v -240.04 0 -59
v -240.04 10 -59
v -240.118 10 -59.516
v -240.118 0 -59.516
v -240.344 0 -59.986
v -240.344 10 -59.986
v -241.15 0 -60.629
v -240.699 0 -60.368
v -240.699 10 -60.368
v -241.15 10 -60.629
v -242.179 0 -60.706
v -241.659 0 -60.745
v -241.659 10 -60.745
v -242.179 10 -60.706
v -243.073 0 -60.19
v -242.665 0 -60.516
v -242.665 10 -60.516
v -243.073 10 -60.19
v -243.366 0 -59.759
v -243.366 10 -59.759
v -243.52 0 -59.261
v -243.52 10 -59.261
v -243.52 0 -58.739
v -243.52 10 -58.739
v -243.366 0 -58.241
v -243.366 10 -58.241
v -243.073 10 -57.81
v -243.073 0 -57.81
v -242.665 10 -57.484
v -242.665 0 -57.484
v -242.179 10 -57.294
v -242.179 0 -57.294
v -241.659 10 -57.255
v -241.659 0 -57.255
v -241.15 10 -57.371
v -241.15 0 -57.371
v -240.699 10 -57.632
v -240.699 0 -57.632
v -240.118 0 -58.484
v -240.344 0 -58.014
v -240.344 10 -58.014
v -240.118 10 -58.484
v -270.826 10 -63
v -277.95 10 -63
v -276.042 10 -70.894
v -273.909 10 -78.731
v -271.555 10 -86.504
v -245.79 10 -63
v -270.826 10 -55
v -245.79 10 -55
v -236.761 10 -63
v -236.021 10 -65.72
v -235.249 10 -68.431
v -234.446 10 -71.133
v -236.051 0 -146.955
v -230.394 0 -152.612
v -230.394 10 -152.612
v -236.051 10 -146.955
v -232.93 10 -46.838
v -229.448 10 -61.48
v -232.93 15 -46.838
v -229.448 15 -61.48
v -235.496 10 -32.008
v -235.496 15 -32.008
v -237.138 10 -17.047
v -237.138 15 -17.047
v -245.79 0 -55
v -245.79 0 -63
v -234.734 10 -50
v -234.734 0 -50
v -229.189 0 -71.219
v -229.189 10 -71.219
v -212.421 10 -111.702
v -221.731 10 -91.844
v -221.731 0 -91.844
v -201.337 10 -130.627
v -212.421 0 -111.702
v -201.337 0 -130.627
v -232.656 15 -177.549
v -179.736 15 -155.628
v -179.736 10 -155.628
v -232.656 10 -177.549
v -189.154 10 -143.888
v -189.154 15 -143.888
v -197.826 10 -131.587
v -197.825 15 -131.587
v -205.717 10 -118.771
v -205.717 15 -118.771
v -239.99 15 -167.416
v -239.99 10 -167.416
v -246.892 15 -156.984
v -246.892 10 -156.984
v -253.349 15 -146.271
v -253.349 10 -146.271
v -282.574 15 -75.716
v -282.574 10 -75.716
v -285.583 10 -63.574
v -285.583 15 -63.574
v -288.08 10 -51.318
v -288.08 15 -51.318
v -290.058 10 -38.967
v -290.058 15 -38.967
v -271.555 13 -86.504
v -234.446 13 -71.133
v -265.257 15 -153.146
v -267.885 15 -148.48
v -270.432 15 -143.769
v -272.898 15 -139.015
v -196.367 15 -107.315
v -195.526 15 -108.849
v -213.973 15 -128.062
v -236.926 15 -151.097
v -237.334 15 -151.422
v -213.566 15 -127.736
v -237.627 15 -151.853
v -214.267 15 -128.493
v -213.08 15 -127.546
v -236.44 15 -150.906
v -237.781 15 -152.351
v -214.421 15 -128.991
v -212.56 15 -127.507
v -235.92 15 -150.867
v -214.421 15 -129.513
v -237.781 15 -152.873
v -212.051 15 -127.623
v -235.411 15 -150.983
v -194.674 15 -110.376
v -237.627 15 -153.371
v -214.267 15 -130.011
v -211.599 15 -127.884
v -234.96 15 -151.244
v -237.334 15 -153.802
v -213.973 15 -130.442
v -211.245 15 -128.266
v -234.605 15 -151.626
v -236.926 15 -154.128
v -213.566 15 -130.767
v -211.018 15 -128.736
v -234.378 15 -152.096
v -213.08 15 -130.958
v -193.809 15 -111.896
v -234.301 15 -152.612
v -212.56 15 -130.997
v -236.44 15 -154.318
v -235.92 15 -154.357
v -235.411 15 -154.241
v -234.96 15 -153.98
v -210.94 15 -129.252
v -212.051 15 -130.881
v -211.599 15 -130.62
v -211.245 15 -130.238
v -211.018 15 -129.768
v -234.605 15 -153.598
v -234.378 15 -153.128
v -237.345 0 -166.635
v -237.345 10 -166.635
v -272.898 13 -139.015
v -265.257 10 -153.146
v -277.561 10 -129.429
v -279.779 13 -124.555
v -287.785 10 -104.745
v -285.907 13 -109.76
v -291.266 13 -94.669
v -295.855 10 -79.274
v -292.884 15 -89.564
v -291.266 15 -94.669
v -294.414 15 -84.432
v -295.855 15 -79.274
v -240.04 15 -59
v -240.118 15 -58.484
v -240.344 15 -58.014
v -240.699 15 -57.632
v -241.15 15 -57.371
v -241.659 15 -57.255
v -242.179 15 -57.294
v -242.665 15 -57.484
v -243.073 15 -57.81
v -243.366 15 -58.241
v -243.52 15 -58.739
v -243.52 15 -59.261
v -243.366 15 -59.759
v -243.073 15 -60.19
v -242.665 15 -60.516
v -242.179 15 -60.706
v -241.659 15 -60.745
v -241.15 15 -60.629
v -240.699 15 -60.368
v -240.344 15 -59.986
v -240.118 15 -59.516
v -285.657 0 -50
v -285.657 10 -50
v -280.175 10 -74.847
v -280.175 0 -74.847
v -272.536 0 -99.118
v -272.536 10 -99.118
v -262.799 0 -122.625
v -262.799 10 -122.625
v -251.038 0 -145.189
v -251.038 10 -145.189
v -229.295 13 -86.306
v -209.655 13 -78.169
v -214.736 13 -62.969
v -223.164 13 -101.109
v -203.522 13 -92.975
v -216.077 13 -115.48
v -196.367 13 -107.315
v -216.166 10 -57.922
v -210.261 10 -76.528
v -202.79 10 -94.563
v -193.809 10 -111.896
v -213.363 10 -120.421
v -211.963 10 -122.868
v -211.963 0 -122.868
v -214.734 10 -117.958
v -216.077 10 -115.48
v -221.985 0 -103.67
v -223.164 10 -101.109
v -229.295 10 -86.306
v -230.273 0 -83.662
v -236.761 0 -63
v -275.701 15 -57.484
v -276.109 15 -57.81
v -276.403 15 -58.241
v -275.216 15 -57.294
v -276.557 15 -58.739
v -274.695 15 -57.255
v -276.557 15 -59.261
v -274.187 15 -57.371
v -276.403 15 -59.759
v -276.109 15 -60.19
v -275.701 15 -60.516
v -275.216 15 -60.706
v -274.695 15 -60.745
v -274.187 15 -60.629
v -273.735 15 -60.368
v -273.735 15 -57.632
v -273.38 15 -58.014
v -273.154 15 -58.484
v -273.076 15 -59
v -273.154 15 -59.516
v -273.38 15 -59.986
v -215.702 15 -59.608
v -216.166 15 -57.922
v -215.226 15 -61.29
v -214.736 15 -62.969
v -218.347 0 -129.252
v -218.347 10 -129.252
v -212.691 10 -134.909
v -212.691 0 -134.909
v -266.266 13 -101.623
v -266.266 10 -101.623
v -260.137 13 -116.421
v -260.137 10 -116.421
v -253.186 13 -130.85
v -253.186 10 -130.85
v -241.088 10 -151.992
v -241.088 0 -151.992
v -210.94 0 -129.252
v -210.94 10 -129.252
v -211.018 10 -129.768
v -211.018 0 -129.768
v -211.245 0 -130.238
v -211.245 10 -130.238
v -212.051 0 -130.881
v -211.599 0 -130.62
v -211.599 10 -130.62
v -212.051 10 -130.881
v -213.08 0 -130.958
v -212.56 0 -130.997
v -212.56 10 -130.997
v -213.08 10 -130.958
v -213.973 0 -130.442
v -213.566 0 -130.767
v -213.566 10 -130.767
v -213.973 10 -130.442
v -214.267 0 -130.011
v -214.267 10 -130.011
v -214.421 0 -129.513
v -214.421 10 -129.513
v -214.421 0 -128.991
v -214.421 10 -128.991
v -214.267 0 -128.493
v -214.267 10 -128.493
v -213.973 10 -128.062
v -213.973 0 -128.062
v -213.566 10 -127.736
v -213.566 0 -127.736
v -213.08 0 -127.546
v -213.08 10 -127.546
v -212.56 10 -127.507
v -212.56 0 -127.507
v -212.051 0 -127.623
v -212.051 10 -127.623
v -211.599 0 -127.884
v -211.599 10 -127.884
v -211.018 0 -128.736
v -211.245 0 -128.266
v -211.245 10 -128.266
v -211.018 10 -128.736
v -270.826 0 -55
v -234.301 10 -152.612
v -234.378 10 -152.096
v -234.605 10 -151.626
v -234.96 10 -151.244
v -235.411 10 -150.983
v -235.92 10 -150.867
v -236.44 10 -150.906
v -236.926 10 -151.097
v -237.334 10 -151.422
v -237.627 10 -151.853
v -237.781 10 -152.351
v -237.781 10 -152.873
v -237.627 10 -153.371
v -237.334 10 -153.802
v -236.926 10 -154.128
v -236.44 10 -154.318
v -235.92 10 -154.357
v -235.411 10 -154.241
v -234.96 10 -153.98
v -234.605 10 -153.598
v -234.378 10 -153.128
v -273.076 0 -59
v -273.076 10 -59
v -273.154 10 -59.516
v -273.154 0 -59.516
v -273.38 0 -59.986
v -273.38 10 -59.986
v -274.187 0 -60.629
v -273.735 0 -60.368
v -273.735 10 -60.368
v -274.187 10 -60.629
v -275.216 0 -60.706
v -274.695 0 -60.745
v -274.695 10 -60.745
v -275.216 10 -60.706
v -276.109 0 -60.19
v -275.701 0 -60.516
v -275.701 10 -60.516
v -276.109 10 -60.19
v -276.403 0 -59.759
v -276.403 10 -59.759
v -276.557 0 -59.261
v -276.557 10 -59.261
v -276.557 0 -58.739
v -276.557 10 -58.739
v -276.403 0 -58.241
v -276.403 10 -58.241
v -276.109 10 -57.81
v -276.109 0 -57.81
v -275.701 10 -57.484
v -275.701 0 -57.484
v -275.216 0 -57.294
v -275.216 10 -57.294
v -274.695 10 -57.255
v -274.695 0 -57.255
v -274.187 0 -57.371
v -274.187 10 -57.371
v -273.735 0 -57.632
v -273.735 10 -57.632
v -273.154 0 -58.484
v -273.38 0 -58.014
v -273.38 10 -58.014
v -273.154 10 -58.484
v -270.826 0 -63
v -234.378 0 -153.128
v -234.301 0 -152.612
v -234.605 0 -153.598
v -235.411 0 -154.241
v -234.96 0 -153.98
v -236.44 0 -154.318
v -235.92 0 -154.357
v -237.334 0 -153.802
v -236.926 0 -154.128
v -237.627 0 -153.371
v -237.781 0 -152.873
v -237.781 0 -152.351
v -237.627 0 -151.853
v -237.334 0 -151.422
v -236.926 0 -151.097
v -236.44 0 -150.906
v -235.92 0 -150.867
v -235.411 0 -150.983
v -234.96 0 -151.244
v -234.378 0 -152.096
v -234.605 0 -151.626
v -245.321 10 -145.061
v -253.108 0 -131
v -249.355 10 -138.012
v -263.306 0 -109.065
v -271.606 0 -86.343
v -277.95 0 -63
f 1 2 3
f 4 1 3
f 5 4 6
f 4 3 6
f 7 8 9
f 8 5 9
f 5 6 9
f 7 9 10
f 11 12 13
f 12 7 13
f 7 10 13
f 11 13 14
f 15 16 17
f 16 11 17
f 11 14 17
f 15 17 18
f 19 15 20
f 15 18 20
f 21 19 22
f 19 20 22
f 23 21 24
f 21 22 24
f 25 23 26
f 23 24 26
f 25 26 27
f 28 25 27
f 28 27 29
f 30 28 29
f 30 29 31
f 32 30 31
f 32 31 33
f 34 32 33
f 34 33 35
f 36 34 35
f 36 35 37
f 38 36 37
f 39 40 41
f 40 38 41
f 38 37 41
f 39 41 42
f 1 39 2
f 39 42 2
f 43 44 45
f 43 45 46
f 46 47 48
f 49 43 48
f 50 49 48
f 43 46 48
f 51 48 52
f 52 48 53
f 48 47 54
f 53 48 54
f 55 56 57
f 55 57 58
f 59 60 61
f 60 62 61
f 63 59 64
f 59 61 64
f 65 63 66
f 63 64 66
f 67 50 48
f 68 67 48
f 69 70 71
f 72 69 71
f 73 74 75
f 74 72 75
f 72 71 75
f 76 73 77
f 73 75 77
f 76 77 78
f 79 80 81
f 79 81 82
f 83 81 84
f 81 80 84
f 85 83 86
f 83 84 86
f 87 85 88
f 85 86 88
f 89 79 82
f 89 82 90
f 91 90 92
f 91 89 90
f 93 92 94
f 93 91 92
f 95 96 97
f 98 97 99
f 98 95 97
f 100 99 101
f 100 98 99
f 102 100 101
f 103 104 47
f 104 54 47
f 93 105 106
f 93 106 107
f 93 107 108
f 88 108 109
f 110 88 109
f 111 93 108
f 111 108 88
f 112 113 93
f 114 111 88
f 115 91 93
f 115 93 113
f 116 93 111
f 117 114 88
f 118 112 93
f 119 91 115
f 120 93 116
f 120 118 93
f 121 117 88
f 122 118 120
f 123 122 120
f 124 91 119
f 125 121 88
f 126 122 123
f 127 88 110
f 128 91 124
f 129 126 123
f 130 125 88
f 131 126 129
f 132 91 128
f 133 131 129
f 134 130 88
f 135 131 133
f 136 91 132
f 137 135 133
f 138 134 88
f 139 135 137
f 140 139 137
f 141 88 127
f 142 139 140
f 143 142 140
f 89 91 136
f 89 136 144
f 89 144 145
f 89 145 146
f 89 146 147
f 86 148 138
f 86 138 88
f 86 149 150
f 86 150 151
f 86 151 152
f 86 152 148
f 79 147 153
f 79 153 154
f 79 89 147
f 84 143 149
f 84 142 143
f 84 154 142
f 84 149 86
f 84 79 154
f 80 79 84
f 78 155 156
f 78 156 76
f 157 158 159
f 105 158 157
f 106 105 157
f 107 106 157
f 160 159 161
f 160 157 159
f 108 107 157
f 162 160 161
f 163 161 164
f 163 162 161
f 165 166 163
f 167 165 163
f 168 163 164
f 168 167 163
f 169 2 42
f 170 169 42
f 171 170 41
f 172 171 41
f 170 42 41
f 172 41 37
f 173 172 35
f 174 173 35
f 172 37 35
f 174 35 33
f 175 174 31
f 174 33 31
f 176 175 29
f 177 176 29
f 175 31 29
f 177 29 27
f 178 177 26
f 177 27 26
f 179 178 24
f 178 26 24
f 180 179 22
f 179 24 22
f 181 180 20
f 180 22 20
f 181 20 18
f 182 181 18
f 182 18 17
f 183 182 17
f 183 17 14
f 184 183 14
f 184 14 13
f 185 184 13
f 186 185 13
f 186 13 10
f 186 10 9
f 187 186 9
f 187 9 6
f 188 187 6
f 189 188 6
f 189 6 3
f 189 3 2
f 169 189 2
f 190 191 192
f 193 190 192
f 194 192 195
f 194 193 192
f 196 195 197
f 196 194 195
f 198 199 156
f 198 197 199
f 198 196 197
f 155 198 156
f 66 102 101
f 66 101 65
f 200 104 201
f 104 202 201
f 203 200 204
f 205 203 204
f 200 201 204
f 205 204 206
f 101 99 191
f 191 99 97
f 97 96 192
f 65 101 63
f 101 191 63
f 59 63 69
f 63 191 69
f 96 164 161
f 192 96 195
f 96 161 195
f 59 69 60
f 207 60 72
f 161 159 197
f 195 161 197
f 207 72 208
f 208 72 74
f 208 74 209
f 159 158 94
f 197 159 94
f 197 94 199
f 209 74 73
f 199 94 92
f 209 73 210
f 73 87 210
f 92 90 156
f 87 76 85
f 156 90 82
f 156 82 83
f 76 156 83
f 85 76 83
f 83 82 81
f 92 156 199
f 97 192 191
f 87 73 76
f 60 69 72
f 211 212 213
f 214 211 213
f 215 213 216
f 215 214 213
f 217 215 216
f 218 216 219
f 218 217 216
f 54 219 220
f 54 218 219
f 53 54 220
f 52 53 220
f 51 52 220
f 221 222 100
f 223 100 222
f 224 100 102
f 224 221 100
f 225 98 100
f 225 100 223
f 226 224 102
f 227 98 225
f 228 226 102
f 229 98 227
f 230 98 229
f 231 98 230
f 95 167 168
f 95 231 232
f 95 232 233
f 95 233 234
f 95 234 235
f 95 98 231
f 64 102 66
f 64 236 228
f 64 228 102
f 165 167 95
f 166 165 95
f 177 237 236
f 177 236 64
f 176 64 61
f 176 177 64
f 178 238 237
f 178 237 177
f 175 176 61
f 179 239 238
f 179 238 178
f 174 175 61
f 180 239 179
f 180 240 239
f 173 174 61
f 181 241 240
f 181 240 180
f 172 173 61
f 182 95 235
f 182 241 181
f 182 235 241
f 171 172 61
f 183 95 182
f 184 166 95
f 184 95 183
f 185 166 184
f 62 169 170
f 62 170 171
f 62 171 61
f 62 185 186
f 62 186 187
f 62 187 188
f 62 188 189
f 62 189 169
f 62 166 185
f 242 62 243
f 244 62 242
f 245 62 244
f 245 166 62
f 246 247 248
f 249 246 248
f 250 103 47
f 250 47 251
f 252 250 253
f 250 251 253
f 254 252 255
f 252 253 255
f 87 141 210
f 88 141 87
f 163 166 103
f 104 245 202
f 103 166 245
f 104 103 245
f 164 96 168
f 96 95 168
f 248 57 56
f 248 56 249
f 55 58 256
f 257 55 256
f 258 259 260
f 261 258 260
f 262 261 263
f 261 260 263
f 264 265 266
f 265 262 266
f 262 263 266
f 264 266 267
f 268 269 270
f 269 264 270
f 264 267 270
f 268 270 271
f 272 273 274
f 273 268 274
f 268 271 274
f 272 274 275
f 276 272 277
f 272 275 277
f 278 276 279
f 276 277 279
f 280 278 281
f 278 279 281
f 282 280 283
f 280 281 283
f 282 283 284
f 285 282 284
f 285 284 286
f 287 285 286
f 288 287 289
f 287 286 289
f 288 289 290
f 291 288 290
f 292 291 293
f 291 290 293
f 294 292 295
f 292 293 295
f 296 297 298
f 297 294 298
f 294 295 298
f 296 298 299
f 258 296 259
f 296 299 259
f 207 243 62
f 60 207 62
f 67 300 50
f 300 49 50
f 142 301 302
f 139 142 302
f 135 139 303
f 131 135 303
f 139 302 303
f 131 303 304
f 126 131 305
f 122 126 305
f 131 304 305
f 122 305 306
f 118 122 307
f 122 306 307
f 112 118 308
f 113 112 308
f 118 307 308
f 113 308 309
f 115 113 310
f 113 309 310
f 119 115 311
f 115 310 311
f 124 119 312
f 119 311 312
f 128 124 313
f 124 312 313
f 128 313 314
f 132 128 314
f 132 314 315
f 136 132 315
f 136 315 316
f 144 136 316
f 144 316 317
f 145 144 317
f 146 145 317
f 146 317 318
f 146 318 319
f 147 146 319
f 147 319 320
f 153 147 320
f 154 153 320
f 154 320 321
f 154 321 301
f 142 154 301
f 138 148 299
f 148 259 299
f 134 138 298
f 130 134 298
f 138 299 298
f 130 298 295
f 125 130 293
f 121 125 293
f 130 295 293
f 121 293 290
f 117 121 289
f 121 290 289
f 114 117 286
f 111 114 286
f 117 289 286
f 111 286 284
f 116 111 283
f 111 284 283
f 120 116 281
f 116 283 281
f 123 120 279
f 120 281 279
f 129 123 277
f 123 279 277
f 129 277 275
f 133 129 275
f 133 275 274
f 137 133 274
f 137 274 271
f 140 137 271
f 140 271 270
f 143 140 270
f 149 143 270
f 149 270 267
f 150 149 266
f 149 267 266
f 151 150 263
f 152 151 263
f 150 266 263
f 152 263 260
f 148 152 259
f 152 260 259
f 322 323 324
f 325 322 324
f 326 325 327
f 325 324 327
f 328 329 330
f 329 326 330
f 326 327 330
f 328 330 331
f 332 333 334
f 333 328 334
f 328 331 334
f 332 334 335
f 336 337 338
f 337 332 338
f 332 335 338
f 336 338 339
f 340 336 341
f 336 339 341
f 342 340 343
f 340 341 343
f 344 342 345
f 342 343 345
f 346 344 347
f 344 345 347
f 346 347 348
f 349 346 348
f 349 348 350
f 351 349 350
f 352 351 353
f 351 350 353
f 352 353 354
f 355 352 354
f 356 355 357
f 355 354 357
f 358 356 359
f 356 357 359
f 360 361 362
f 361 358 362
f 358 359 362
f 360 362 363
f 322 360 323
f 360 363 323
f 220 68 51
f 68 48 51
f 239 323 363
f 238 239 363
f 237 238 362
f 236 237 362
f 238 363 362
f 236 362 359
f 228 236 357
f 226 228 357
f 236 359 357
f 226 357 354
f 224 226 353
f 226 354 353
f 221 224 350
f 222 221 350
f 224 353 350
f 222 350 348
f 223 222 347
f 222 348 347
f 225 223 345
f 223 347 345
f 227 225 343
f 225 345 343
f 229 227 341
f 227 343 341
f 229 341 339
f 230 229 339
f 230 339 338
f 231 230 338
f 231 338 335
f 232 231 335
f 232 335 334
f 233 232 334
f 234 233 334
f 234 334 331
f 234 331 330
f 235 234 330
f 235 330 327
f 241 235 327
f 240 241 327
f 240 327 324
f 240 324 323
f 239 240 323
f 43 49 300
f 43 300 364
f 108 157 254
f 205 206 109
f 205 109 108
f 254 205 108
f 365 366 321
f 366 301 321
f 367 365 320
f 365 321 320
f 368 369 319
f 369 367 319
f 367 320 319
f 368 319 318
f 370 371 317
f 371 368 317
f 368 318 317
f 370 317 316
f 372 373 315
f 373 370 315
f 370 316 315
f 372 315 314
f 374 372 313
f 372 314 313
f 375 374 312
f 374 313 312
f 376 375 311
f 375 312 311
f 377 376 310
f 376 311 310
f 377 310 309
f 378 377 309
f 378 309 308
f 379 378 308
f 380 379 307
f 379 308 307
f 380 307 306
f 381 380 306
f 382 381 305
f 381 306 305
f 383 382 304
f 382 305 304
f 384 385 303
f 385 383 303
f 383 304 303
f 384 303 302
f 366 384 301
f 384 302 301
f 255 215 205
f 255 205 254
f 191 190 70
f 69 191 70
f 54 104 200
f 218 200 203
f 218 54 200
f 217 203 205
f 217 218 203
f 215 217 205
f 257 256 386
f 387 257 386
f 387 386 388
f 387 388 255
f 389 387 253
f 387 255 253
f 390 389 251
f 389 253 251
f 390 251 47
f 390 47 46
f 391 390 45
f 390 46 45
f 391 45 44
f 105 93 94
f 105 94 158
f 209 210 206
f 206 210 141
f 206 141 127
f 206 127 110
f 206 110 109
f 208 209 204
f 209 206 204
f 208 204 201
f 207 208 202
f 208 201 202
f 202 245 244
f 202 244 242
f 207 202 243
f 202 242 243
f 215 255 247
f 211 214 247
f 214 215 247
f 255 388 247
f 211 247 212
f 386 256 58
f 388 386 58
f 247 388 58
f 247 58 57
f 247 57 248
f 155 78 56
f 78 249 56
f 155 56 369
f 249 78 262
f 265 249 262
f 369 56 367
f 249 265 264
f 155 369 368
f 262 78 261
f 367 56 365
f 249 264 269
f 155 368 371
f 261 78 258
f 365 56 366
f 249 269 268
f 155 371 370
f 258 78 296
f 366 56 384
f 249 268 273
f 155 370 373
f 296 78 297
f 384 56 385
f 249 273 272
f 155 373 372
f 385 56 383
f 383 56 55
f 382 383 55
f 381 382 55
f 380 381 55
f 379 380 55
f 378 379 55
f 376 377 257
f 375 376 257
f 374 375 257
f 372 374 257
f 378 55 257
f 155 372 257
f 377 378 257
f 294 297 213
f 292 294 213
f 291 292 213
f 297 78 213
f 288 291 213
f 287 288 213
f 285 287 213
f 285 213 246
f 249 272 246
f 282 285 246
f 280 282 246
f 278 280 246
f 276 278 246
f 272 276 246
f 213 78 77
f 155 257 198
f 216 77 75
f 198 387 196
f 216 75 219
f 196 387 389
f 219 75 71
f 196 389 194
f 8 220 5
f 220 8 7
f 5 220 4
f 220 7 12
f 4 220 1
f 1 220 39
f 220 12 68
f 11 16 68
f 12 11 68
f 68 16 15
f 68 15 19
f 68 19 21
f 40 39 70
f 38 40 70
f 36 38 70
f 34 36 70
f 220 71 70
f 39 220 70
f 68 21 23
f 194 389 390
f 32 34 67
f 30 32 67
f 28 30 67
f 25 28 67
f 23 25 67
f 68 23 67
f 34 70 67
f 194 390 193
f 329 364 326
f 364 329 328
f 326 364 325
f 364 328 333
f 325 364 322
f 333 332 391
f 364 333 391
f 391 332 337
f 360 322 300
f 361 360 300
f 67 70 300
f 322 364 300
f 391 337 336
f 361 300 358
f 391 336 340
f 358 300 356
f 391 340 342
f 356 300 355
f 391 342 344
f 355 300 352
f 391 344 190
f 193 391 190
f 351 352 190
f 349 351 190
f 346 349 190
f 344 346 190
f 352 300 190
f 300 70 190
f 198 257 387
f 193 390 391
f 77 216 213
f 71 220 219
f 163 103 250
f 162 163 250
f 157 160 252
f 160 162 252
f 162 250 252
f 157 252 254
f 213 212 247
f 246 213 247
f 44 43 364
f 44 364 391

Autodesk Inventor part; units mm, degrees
ref_plane "YZ Plane" through (0, 0, 0) normal (1, 0, 0) x (0, 1, 0)
sketch "Sketch1" plane through (0, 0, 0) normal (0, 1, 0) x (-1, 0, 0)
  circle A0 centre (0, 0) radius 217.5
  circle A1 centre (0, 0) radius 312.5
  line L0 (0, 0) -> (220.9709, -220.9709)
  line L1 (0, 0) -> (312.5, 0) construction
  line L2 (312.1398, -15) -> (216.9821, -15)
  line L3 (231.3228, -210.1096) -> (164.0361, -142.8229)
  circle A2 centre (0, 0) radius 240
  circle A3 centre (0, 0) radius 290
  line L4 (285.6571, -50) -> (234.7339, -50)
  line L5 (237.3454, -166.6348) -> (201.3373, -130.6266)
  dimension "d0" = 435
  dimension "d1" = 625
  dimension "d2" = 45
  dimension "d3" = 15
  dimension "d4" = 15
  dimension "d5" = 22.5
  dimension "d6" = 22.5
  dimension "d7" = 35
  dimension "d8" = 35
extrude "Extrusion1" add sketch "Sketch1" along normal blind 10 contours A2 L4 A3 L5
sketch "Sketch2" plane through (0, 10, 0) normal (0, 1, 0) x (1, 0, 0)
  arc A0 (-237.3454, 166.6348) -> (-285.6571, 50) centre (0, 0) ccw projected
  line L0 (-285.6571, 50) -> (-234.7339, 50) projected
  arc A1 (-201.3373, 130.6266) -> (-234.7339, 50) centre (0, 0) ccw projected
  line L1 (-201.3373, 130.6266) -> (-237.3454, 166.6348) projected
  circle A2 centre (0, 0) radius 245
  circle A3 centre (0, 0) radius 285
  line L2 (-279.6426, 55) -> (-238.7467, 55)
  line L3 (-236.6281, 158.8463) -> (-207.7103, 129.9286)
  line L4 (-239.8437, 50) -> (-280.5798, 50)
  line L5 (-204.9504, 134.2398) -> (-233.7552, 163.0445)
  dimension "d11" = 5
  dimension "d12" = 5
  dimension "d13" = 5
  dimension "d14" = 5
extrude "Extrusion2" cut sketch "Sketch2" against normal up to surface (10 mm away) contours L3 A2 L2 A3
sketch "Sketch3" plane through (0, 10, 0) normal (0, 1, 0) x (1, 0, 0)
  arc A0 (-236.6281, 158.8463) -> (-279.6426, 55) centre (0, 0) ccw projected
  line L0 (-236.6281, 158.8463) -> (-207.7103, 129.9286) projected
  arc A1 (-207.7103, 129.9286) -> (-238.7467, 55) centre (0, 0) ccw projected
  line L1 (-238.7467, 55) -> (-279.6426, 55) projected
  arc A2 (-237.3454, 166.6348) -> (-285.6571, 50) centre (0, 0) ccw projected
  line L2 (-285.6571, 50) -> (-234.7339, 50) projected
  arc A3 (-201.3373, 130.6266) -> (-234.7339, 50) centre (0, 0) ccw projected
  line L3 (-201.3373, 130.6266) -> (-237.3454, 166.6348) projected
  circle A4 centre (0, 0) radius 217.5
  circle A5 centre (0, 0) radius 312.5
  line L4 (0, 0) -> (100, 0) construction
  line L5 (0, 0) -> (-220.9709, 220.9709)
  line L6 (0, 0) -> (312.5, 0) construction
  line L7 (-312.1398, 15) -> (-216.9821, 15)
  line L8 (-164.0361, 142.8229) -> (-231.3228, 210.1096)
  line L9 (-437.5, 0) -> (437.5, 0) projected
  dimension "d17" = 435
  dimension "d18" = 625
  dimension "d21" = 135
  dimension "d22" = 15
  dimension "d23" = 15
extrude "Extrusion3" add sketch "Sketch3" along normal blind 5 contours L0 A1 L1 A0 | L3 A3 L2 A2 | A4 L7 A5 L8
sketch "Sketch4" plane through (0, 15, 0) normal (0, 1, 0) x (1, 0, 0)
  arc A0 (-231.3228, 210.1096) -> (-312.1398, 15) centre (0, 0) ccw projected
  line L0 (-312.1398, 15) -> (-216.9821, 15) projected
  arc A1 (-164.0361, 142.8229) -> (-216.9821, 15) centre (0, 0) ccw projected
  line L1 (-164.0361, 142.8229) -> (-231.3228, 210.1096) projected
  circle A2 centre (0, 0) radius 217.5
  circle A3 centre (0, 0) radius 312.5
  line L2 (0, 0) -> (4.6194, -1.9134) construction
  line L3 (0, 0) -> (5, 0) construction
  circle A4 centre (4.6194, -1.9134) radius 242.5
  circle A5 centre (4.6194, -1.9134) radius 297.5
  line L4 (0, 0) -> (-288.7124, 119.5886) construction
  line L5 (0, 0) -> (-270.6329, 156.25)
  line L6 (0, 0) -> (-301.8518, 80.881)
  circle A6 centre (4.6194, -1.9134) radius 228.75
  circle A7 centre (4.6194, -1.9134) radius 311.25
  point P0 (-253.3489, 146.271)
  point P1 (-217.3642, 196.151)
  point P2 (-282.5739, 75.7155)
  point P3 (-292.3994, 15)
  point P4 (-205.7173, 118.7709)
  point P5 (-188.3605, 108.75)
  point P6 (-178.396, 157.1828)
  point P7 (-210.0889, 56.2931)
  point P8 (-229.4479, 61.4804)
  point P9 (-237.2901, 15)
  point P10 (-295.8554, 79.2742)
  point P11 (-265.2567, 153.146)
  point P12 (-193.8094, 111.8959)
  point P13 (-216.1663, 57.9216)
  dimension "d26" = 625
  dimension "d27" = 435
  dimension "d28" = 5
  dimension "d29" = 22.5
  dimension "d30" = 485
  dimension "d31" = 595
  dimension "d33" = 15
  dimension "d36" = 457.5
  dimension "d37" = 622.5
extrude "Extrusion4" cut sketch "Sketch4" against normal blind 10 contours L1 A7 L5 A0 | L5 A7 L6 A0 | L1 A5 L5 A7 | L6 A7 L0 A0 | L6 A5 L0 A7 | L1 A6 L5 A4 | L1 A1 L5 A6 | L6 A6 L0 A4 | L5 A1 L6 A6 | L6 A1 L0 A6
sketch "Sketch5" plane through (0, 15, 0) normal (0, 1, 0) x (1, 0, 0)
  arc A0 (-282.5739, 75.7155) -> (-292.3994, 15) centre (4.6194, -1.9134) ccw projected
  line L0 (-292.3994, 15) -> (-237.2901, 15) projected
  arc A1 (-229.4479, 61.4804) -> (-237.2901, 15) centre (4.6194, -1.9134) ccw projected
  line L1 (-229.4479, 61.4804) -> (-216.1663, 57.9216) projected
  arc A2 (-193.8094, 111.8959) -> (-216.1663, 57.9216) centre (4.6194, -1.9134) ccw projected
  line L2 (-193.8094, 111.8959) -> (-205.7173, 118.7709) projected
  arc A3 (-178.396, 157.1828) -> (-205.7173, 118.7709) centre (4.6194, -1.9134) ccw projected
  line L3 (-178.396, 157.1828) -> (-217.3642, 196.151) projected
  arc A4 (-217.3642, 196.151) -> (-253.3489, 146.271) centre (4.6194, -1.9134) ccw projected
  line L4 (-253.3489, 146.271) -> (-265.2567, 153.146) projected
  arc A5 (-265.2567, 153.146) -> (-295.8554, 79.2742) centre (4.6194, -1.9134) ccw projected
  line L5 (-295.8554, 79.2742) -> (-282.5739, 75.7155) projected
  arc A6 (-157.7572, 146.5246) -> (-215.1597, 7.9427) centre (4.6194, -1.9134) ccw
  arc A7 (-254.0861, 186.4253) -> (-311.4886, 47.8434) centre (4.6194, -1.9134) ccw
  line L6 (-311.4886, 47.8434) -> (-215.1597, 7.9427)
  line L7 (-157.7572, 146.5246) -> (-254.0861, 186.4253)
  line L8 (-291.0221, 120.5453) -> (-198.6341, 82.2769) construction
  line L9 (-282.9381, 117.1968) -> (-206.718, 85.6254) construction
  point P0 (0, 0)
  point P1 (-244.8281, 101.4111)
  point P2 (-244.8281, 101.4111)
  point P3 (-232.656, 177.5487)
  point P4 (-179.7358, 155.6284)
  point P5 (-237.1383, 17.0465)
  point P6 (-290.0585, 38.9667)
  dimension "d38" = 150
  dimension "d39" = 104.2656
extrude "Extrusion5" cut sketch "Sketch5" against normal blind 10 contours L6 A1 L0 A0 | A4 L3 A3 L7
ref_plane "Work Plane2" through (-220.8757, 0, -44.2597) normal (-0.9238795, 0, -0.3826834) x (0, 1, 0)
ref_plane "Work Plane1" through (-234.7339, 0, -50) normal (-0.9238795, 0, -0.3826834) x (0, 1, 0)
sketch "Sketch7" plane through (0, 10, 0) normal (0, -1, 0) x (1, 0, 0)
  arc A0 (-279.6426, -55) -> (-236.6281, -158.8463) centre (0, 0) ccw projected
  line L0 (-236.6281, -158.8463) -> (-207.7103, -129.9286) projected
  arc A1 (-238.7467, -55) -> (-207.7103, -129.9286) centre (0, 0) ccw projected
  arc A2 (-238.7467, -55) -> (-207.7103, -129.9286) centre (0, 0) ccw projected
  line L1 (-238.7467, -55) -> (-279.6426, -55) projected
  arc A3 (-279.6426, -55) -> (-236.6281, -158.8463) centre (0, 0) ccw projected
  arc A4 (-291.5761, -93.715) -> (-272.4419, -139.9089) centre (4.6194, 1.9134) ccw projected
  line L2 (-195.885, -108.198) -> (-272.4419, -139.9089) projected
  arc A5 (-215.0192, -62.0041) -> (-195.885, -108.198) centre (4.6194, 1.9134) ccw projected
  line L3 (-215.0192, -62.0041) -> (-291.5761, -93.715) projected
  arc A6 (-279.6426, -55) -> (-236.6281, -158.8463) centre (0, 0) ccw projected
  line L4 (-279.6426, -55) -> (-238.7467, -55) projected
  arc A7 (-238.7467, -55) -> (-207.7103, -129.9286) centre (0, 0) ccw projected
  line L5 (-207.7103, -129.9286) -> (-236.6281, -158.8463) projected
  arc A8 (-285.6571, -50) -> (-237.3454, -166.6348) centre (0, 0) ccw projected
  line L6 (-201.3373, -130.6266) -> (-237.3454, -166.6348) projected
  arc A9 (-234.7339, -50) -> (-201.3373, -130.6266) centre (0, 0) ccw projected
  line L7 (-285.6571, -50) -> (-234.7339, -50) projected
  line L8 (-233.2223, -155.4405) -> (-236.0507, -152.6121) construction
  line L9 (-236.0507, -152.6121) -> (-238.8791, -155.4405) construction
  line L10 (-209.8621, -132.0804) -> (-212.6905, -129.2519) construction
  line L11 (-212.6905, -129.2519) -> (-209.8621, -126.4235) construction
  circle A10 centre (-212.6905, -129.2519) radius 1.75
  circle A11 centre (-236.0507, -152.6121) radius 1.75
  line L12 (-274.8261, -55) -> (-274.8261, -59) construction
  line L13 (-274.8261, -59) -> (-278.8261, -59) construction
  line L14 (-241.7898, -55) -> (-241.7898, -59) construction
  line L15 (-241.7898, -59) -> (-237.7898, -59) construction
  circle A12 centre (-241.7898, -59) radius 1.75
  circle A13 centre (-274.8261, -59) radius 1.75
  line L16 (-233.2223, -162.5116) -> (-226.8583, -156.1476)
  line L17 (-226.8583, -156.1476) -> (-236.0507, -146.9553)
  line L18 (-236.0507, -146.9553) -> (-242.4147, -153.3192)
  line L19 (-242.4147, -153.3192) -> (-233.2223, -162.5116)
  line L20 (-209.155, -138.4443) -> (-201.3373, -130.6266)
  line L21 (-201.3373, -130.6266) -> (-210.5297, -121.4342)
  line L22 (-210.5297, -121.4342) -> (-218.3474, -129.2519)
  line L23 (-218.3474, -129.2519) -> (-209.155, -138.4443)
  line L24 (-285.6571, -50) -> (-270.8261, -50)
  line L25 (-270.8261, -50) -> (-270.8261, -63)
  line L26 (-270.8261, -63) -> (-285.6571, -63)
  line L27 (-285.6571, -63) -> (-285.6571, -50)
  line L28 (-234.7339, -50) -> (-245.7898, -50)
  line L29 (-245.7898, -50) -> (-245.7898, -63)
  line L30 (-245.7898, -63) -> (-234.7339, -63)
  line L31 (-234.7339, -63) -> (-234.7339, -50)
  line L32 (-236.6281, -158.8463) -> (-207.7103, -129.9286) projected
  line L33 (-238.7467, -55) -> (-279.6426, -55) projected
  arc A14 (-279.6426, -55) -> (-236.6281, -158.8463) centre (0, 0) ccw projected
  line L34 (-236.6281, -158.8463) -> (-207.7103, -129.9286) projected
  arc A15 (-238.7467, -55) -> (-207.7103, -129.9286) centre (0, 0) ccw projected
  line L35 (-238.7467, -55) -> (-279.6426, -55) projected
  point P0 (-214.4385, -125.3431)
  point P1 (-277.9496, -63)
  point P2 (-270.8261, -55)
  point P3 (-236.7615, -63)
  point P4 (-245.7898, -55)
  point P5 (-212.6905, -134.9088)
  point P6 (-211.9634, -122.8679)
  point P7 (-241.0878, -151.9923)
  point P8 (-230.3939, -152.6121)
  dimension "d51" = 4
  dimension "d52" = 4
  dimension "d54" = 4
  dimension "d55" = 4
  dimension "d56" = 3.5
  dimension "d57" = 3.5
  dimension "d58" = 4
  dimension "d59" = 4
  dimension "d60" = 4
  dimension "d61" = 4
  dimension "d62" = 3.5
  dimension "d63" = 3.5
  dimension "d64" = 4
  dimension "d65" = 4
  dimension "d66" = 5
  dimension "d71" = 4
  dimension "d72" = 4
  dimension "d73" = 4
  dimension "d74" = 4
  dimension "d75" = 4
  dimension "d76" = 4
extrude "Extrusion7" add sketch "Sketch7" along normal blind 10 contours L1 L25 L26 A0 | L1 A1 L30 L29 | L18 L17 L0 A0 | A1 L0 L23 L22
extrude "Extrusion8" cut sketch "Sketch7" against normal up to next contours A10 | A11 | A12 | A13
ref_plane "Work Plane4" through (-216.1663, 15, -57.9216) normal (0.9238795, 0, 0.3826834) x (0, -1, 0)
sketch "Sketch9" plane through (-216.1663, 15, -57.9216) normal (0.9238795, 0, 0.3826834) x (0, -1, 0)
  line L0 (5, 58.4214) -> (5, 0) projected
  line L1 (0, 58.4214) -> (5, 58.4214) projected
  line L2 (0, 0) -> (0, 58.4214) projected
  line L3 (0, 0) -> (5, 0) projected
  line L4 (15, -14.4241) -> (15, 72.8455) projected
  line L5 (15, 72.8455) -> (5, 72.8455) projected
  line L6 (5, -14.4241) -> (5, 72.8455) projected
  line L7 (15, -14.4241) -> (5, -14.4241) projected
  line L8 (-2, 5.2107) -> (2, 5.2107)
  line L9 (2, 5.2107) -> (2, 53.2107)
  line L10 (2, 53.2107) -> (-2, 53.2107)
  line L11 (-2, 53.2107) -> (-2, 5.2107)
  line L12 (-2, 5.2107) -> (2, 53.2107) construction
  line L13 (2, 5.2107) -> (-2, 53.2107) construction
  point P0 (15, 29.2107)
  point P1 (0, 29.2107)
  dimension "d85" = 4
  dimension "d86" = 48
extrude "Extrusion10" cut sketch "Sketch9" against normal up to next contours L10 L9 L8 L2 | L2 L8 L11 L10
sketch "Sketch10" plane through (0, 10, 0) normal (0, -1, 0) x (1, 0, 0)
  arc A0 (-291.2664, -94.6691) -> (-272.8976, -139.0153) centre (4.6194, 1.9134) ccw projected
  line L0 (-214.736, -62.9692) -> (-291.2664, -94.6691) projected
  arc A1 (-214.736, -62.9692) -> (-196.3672, -107.3154) centre (4.6194, 1.9134) ccw projected
  line L1 (-196.3672, -107.3154) -> (-272.8976, -139.0153) projected
  line L2 (-245.7898, -63) -> (-245.7898, -55) projected
  line L3 (-245.7898, -55) -> (-270.8261, -55) projected
  line L4 (-270.8261, -55) -> (-270.8261, -63) projected
  line L5 (-270.8261, -63) -> (-277.9496, -63) projected
  arc A2 (-277.9496, -63) -> (-241.0878, -151.9923) centre (0, 0) ccw projected
  line L6 (-241.0878, -151.9923) -> (-236.0507, -146.9553) projected
  line L7 (-236.0507, -146.9553) -> (-230.3939, -152.6121) projected
  line L8 (-230.3939, -152.6121) -> (-212.6905, -134.9088) projected
  line L9 (-212.6905, -134.9088) -> (-218.3474, -129.2519) projected
  line L10 (-218.3474, -129.2519) -> (-211.9634, -122.8679) projected
  arc A3 (-236.7615, -63) -> (-211.9634, -122.8679) centre (0, 0) ccw projected
  line L11 (-236.7615, -63) -> (-245.7898, -63) projected
  point P0 (-216.0774, -115.4796)
  point P1 (-234.4462, -71.1334)
  point P2 (-271.5548, -86.5043)
  point P3 (-253.186, -130.8505)
extrude "Extrusion11" cut sketch "Sketch10" against normal blind 10 contours L0 A3 L1 A2
properties part number "Battery Module Third Iteration Top wING" material "PLA Plastic"
